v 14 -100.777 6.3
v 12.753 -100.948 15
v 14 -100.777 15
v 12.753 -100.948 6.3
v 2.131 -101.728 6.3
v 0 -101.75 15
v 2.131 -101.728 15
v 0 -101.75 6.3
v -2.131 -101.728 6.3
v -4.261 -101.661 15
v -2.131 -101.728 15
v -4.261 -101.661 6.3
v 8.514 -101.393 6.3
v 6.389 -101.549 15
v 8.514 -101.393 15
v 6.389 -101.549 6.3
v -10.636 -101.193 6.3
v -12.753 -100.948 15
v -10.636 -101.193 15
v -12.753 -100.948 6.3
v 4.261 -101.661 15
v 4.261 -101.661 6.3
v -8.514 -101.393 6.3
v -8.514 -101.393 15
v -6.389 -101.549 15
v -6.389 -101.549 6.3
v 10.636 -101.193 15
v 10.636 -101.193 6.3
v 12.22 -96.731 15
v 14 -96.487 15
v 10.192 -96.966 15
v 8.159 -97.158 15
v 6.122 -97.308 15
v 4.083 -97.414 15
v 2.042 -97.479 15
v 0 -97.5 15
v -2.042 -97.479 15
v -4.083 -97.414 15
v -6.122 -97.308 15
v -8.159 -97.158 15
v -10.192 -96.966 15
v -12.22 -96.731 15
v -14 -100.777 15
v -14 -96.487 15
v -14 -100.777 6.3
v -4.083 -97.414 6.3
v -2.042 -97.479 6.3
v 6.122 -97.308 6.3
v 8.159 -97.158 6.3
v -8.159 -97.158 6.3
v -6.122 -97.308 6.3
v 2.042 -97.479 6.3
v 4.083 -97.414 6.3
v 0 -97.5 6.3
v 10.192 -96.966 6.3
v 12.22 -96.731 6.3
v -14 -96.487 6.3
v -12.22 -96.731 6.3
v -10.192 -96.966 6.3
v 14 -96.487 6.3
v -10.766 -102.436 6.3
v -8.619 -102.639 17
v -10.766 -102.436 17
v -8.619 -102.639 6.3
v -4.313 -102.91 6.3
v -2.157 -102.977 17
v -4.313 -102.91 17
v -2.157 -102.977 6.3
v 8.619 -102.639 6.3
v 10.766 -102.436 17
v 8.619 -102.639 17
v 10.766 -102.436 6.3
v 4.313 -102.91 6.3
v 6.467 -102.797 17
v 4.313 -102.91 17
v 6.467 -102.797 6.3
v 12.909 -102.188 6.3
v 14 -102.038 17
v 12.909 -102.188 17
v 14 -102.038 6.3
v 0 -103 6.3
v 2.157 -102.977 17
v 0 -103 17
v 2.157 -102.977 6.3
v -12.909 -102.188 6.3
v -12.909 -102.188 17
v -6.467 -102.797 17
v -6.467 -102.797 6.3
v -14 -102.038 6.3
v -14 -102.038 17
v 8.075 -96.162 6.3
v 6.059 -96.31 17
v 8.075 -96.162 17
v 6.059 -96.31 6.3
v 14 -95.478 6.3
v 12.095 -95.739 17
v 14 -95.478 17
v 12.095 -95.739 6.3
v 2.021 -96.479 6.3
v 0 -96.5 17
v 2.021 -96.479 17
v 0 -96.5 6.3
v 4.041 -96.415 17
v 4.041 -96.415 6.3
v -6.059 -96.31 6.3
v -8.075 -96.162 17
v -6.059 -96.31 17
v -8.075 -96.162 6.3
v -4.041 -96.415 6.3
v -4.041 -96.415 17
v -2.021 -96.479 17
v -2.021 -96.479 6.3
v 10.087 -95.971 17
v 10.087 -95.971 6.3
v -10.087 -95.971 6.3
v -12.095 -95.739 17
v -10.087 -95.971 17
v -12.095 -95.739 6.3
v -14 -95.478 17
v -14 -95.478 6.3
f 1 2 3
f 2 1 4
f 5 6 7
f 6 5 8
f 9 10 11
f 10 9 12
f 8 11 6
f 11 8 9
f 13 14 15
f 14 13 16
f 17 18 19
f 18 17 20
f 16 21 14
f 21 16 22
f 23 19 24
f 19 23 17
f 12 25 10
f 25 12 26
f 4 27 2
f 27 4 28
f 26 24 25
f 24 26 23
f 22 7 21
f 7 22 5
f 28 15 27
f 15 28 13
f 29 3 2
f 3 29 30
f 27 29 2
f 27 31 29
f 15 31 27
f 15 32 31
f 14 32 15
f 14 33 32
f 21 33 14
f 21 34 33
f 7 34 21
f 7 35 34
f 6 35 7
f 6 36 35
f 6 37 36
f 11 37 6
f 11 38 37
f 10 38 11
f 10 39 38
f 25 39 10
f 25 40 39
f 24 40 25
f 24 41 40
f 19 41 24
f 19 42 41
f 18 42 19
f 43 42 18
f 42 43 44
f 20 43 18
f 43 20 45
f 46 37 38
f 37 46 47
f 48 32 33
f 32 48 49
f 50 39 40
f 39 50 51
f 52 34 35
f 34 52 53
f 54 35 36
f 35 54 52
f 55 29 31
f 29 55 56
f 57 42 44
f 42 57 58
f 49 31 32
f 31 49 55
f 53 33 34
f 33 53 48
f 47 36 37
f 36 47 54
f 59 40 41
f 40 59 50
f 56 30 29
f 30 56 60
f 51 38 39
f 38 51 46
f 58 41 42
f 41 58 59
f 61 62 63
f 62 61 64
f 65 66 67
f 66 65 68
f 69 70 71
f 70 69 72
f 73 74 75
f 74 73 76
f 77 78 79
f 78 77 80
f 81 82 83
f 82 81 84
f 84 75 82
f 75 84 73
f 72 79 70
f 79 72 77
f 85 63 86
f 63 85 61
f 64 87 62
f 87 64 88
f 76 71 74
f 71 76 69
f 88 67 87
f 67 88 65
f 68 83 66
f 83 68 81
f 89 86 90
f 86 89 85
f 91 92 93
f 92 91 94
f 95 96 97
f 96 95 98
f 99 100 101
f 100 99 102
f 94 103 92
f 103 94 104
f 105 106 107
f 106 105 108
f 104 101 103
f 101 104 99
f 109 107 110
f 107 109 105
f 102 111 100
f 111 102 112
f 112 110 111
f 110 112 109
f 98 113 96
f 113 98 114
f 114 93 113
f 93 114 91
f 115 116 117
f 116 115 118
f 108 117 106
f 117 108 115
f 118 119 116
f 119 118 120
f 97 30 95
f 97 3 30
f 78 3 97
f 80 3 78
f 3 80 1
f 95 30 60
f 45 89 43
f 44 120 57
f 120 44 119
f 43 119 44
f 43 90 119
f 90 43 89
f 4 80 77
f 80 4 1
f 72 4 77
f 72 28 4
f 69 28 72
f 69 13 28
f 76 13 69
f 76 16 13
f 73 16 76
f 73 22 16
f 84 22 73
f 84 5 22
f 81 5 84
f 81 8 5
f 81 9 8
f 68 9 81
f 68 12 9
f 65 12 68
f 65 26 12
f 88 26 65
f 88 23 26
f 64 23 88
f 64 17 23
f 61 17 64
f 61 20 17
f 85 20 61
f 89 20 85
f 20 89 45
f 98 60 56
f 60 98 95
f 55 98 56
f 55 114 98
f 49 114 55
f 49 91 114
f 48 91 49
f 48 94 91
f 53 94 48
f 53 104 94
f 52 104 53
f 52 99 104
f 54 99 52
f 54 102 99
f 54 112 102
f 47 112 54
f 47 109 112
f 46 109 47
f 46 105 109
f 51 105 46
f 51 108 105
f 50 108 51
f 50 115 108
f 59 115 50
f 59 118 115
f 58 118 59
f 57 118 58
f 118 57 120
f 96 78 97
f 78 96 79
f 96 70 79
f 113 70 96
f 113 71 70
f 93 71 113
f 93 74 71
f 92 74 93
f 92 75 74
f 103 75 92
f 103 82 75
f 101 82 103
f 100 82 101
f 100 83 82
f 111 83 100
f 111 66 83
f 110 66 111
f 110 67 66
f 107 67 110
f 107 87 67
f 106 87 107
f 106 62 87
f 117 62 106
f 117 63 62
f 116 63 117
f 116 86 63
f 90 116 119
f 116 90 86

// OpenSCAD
// fan hose adaptor ring 
// Nigel P. Pedersen
// Emory University, Atlanta, GA
// Version 0.2
// April 29th - May 12, 2021

// PARTS
// Tubing:  uxcell PVC Clear Vinyl Tubing, Plastic Flexible Water Pipe 22mm ID x 25mm OD, 1m (Amazon)
//          note that the dimensions above are not correct, likely ~22 mm ID x ~23.2 mm OD
// Barrel:     Oggi 8" D x 8" H

//dims for EF sensors: l/w/t 10x10x2

// GLOBALS

resolution = 300;

wall_thickness = 4;  // 3 mm seems too thick, uses too much filament
main_housing_height = 60;

real_barrel_od = 195;
real_barrel_wall_thickness = 4.5;
real_barrel_id = real_barrel_od-real_barrel_wall_thickness*2;
outer_wall_d=real_barrel_od+real_barrel_wall_thickness;

hose_id = 22;// fan_diameter/2; // or enter exact value - should be close to this number
hose_wall_thickness = 1.2;
hose_od = hose_id + hose_wall_thickness * 2;
hose_housing_h = 15;
grill_vane_h = 5;
grill_h = 20;
grill_vane_thickness = 0.5;

// vent_grill_variables?

// MAIN
difference(){
difference(){
translate([0,0,5])cylinder(d=outer_wall_d+6.5, h=main_housing_height/2, center=true, $fn=resolution);
difference () {
    
    smaller_ring ();
    // change -150 v 150 to separate halves for printing
    union(){
        
    translate([outer_wall_d/2-1,0,-10]) color("red") EF_slot();
        
    //translate([real_barrel_od/3,0,20]) rotate([0,-90,180])  color("blue") EF_slot();
    translate([97,0,15]) rotate([0,-90,180])  color("blue") EF_slot();
        
}
}
}
cylinder(d=193,h=50,center=true,$fn=resolution);
translate([14,-150,-50])cube(300);
translate([-314,-150,-50])cube(300);
translate([-75,75,-50])cube(300);
#translate([0,-80,-18.7])cube(50, center=true);
translate([0,-80,42])cube(50, center=true);
}

//translate([outer_wall_d/2-0.5,0,0]) color("red") EF_slot();

//EF_slot();
//translate([real_barrel_od/3,0,11]) rotate([0,-90,180])  color("blue") EF_slot();

module smaller_ring(){

difference(){
    cylinder (d=outer_wall_d+4, h=main_housing_height/2, center=true, $fn=resolution);
    cylinder (d=real_barrel_od, h=main_housing_height/2+1, center=true, $fn=resolution);
                
}

}

module main_ring () {
    difference () {
        union () { // POSITIVES
        // main housing
            // smaller ring
                //translate ([0,0,0]) cylinder (d=outer_wall_d+1, h=main_housing_height/2, center=true, $fn=resolution);
                translate([0,0,main_housing_height/4])linear_extrude(4) circle(d=outer_wall_d+10, $fn=resolution);

        }
        
        
        union () { // NEGATIVES
            // smaller ring
                
            difference(){
                translate([0,0,3])
                smaller_ring();
            
                
                
                }
            
            // larger ring
                //translate ([0,0,main_housing_height/2+0.5]) cylinder (d=real_barrel_od-1-wall_thickness*2, h=main_housing_height/2, center=true, $fn=resolution);
            // hose conduit
                //rotate ([0,90,0]) translate ([-main_housing_height/2,0,real_barrel_od/2-4.9]) cylinder (d1 = hose_od+5, d2 = hose_od, h = hose_housing_h+10, center = true, $fn = resolution);
            // inlet
                //rotate ([0,270,0]) translate ([main_housing_height/2,0,real_barrel_od/2]) cylinder (d = hose_od+5, h = hose_housing_h+10, center = true, $fn = resolution);
            // lip
                //translate ([0,0,main_housing_height]) cylinder (d=172, h=wall_thickness+0.5, center = true, $fn = resolution);
            
        }
    }

    //translate ([real_barrel_id/2+wall_thickness/2,0,main_housing_height/2-grill_h/2]) rotate ([0,0,270]) grill ();
    //translate ([-real_barrel_id/2-wall_thickness,0,main_housing_height/2-grill_h/2]) rotate ([0,0,270]) grill ();
}

// PROCEDURES
// grill

module EF_slot() {
    union(){
    translate([-1,0,-8]) cube([2,10,32], center=true);
    translate([1,0,0]) cube([2,16,32], center=true);
        
        
        translate([2,0,0]) cube([2,7,32], center=true);
        
       translate([2,0,10]) cube([2,16,6], center=true); 
        
        
        }  
    };

module grill () {
    for(i = [-2 : grill_vane_h : grill_h+grill_vane_h]) {
        translate ([0,0,i]) rotate ([45,0,0]) cube ([hose_od+5,grill_vane_h*1.3,grill_vane_thickness], center=true);
    }
}
